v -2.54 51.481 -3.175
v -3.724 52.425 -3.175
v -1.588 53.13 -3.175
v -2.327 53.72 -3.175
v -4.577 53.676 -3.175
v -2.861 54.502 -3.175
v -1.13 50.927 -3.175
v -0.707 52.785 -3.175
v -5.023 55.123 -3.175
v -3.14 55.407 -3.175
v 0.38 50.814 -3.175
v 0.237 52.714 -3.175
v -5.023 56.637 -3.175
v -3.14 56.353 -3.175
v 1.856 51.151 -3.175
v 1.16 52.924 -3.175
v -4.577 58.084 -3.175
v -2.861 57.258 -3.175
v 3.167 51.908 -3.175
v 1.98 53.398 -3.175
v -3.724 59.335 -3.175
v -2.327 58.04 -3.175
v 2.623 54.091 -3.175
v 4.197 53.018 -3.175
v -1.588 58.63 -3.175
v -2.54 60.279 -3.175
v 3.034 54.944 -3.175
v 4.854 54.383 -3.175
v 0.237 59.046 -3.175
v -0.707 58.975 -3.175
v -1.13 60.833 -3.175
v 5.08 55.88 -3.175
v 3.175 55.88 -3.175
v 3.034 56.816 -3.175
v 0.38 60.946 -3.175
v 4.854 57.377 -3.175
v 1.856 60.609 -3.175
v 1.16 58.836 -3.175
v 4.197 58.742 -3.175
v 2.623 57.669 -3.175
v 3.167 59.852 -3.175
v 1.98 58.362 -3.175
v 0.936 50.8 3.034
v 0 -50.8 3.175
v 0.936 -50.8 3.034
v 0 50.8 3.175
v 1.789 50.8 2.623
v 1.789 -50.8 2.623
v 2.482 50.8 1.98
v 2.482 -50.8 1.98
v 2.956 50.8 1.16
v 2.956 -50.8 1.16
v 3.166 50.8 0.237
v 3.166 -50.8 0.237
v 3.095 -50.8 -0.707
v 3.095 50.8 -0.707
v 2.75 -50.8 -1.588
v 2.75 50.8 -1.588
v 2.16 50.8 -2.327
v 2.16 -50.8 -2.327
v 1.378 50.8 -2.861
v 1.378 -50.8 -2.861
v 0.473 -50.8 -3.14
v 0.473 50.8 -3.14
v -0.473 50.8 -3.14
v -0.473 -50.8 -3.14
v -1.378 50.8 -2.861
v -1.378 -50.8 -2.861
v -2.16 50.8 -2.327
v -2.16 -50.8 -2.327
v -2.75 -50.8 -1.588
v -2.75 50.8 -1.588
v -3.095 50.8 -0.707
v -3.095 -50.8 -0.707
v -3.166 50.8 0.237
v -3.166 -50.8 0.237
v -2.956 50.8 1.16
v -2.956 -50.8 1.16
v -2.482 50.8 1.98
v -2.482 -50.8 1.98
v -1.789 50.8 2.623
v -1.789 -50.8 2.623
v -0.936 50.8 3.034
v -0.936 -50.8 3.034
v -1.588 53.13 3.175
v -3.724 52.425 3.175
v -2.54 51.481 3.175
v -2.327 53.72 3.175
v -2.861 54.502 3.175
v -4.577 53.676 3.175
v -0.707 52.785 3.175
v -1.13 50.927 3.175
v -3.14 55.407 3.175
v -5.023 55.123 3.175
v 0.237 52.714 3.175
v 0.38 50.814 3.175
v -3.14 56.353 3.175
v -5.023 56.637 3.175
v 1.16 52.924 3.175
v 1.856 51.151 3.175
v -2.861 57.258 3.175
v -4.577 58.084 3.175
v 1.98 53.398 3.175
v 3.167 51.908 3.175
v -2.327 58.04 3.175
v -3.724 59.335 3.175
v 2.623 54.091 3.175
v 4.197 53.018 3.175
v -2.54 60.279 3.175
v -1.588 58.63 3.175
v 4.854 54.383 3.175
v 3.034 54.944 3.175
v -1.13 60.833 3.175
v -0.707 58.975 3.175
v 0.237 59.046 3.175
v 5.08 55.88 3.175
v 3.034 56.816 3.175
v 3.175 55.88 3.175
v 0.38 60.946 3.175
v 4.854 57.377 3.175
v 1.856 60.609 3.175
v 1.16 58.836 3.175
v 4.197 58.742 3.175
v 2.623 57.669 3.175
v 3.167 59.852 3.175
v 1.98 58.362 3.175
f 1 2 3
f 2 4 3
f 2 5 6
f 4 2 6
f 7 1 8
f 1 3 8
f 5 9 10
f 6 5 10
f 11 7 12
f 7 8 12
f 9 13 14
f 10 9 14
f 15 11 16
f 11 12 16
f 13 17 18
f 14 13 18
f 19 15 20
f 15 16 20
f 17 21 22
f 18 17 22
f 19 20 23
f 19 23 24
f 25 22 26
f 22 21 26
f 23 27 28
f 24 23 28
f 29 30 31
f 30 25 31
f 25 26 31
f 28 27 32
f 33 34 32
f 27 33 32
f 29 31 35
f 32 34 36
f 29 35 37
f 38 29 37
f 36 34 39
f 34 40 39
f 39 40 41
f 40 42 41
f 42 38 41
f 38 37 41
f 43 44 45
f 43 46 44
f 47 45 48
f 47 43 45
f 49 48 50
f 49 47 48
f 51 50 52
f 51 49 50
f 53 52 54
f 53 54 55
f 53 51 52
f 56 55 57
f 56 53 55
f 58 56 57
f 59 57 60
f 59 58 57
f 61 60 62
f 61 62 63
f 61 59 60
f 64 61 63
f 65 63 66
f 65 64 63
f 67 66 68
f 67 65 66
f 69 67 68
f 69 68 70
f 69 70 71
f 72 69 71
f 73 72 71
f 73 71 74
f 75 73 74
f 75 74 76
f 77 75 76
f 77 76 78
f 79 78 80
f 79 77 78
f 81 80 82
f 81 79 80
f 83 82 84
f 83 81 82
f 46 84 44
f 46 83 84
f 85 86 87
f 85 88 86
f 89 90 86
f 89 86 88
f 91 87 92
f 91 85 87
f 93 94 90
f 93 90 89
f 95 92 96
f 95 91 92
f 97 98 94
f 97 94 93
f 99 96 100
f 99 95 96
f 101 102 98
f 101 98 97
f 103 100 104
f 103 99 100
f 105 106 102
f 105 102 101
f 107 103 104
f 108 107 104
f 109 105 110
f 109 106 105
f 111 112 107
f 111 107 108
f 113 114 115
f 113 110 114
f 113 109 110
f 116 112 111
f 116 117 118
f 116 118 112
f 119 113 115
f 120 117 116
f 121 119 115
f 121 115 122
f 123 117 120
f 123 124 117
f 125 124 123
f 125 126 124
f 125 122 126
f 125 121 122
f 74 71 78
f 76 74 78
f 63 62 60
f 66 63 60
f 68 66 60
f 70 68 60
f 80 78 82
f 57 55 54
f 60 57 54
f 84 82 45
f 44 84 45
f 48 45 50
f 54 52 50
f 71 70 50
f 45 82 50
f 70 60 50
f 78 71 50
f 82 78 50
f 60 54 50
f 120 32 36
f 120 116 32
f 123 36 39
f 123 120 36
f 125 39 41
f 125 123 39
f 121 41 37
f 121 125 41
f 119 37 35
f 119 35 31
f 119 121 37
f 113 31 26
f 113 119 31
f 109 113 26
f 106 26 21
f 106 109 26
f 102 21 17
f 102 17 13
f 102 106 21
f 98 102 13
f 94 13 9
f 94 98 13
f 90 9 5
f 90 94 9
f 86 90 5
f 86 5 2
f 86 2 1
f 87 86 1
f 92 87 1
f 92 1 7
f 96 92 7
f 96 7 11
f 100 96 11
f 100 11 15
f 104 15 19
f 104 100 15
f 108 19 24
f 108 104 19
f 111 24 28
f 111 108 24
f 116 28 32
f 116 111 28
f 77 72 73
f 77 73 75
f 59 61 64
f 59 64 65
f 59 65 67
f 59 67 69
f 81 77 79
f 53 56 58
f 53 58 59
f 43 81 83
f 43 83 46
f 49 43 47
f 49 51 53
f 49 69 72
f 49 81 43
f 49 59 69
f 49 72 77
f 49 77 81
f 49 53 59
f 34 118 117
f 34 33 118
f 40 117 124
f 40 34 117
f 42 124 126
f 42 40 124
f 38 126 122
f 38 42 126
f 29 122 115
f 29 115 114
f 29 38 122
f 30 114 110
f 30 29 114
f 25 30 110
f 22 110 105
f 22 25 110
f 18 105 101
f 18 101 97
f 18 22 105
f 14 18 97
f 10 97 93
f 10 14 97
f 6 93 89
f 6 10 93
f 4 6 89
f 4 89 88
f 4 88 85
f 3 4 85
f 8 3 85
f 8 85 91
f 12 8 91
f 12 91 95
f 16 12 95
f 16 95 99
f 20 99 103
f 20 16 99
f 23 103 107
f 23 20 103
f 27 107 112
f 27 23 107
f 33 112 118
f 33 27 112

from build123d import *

# Parameters (mm, degrees)
SKETCH1_R           = 3.175
BOSS_EXTRUDE1_DEPTH = 50.8
SKETCH2_R           = 5.08
SKETCH2_R_2         = 3.175
BOSS_EXTRUDE2_DEPTH = 3.175


with BuildPart() as part:
    # Sketch1 → Boss-Extrude1 (new, symmetric)
    with BuildSketch(Plane(origin=(0, 0, 0), x_dir=(1, 0, 0), z_dir=(0, 1, 0))):
        with Locations(Location((0, 0, 0), (0, 0, 270))):
            Circle(SKETCH1_R)
    extrude(amount=BOSS_EXTRUDE1_DEPTH, both=True)


with BuildPart() as body_2:
    # Sketch2 → Boss-Extrude2 (new, symmetric)
    with BuildSketch(Plane.XY):
        with Locations((0, 55.88)):
            Circle(SKETCH2_R)
        with Locations((0, 55.88)):
            Circle(SKETCH2_R_2, mode=Mode.SUBTRACT)
    extrude(amount=BOSS_EXTRUDE2_DEPTH, both=True)


solid = Compound([part.part, body_2.part])
